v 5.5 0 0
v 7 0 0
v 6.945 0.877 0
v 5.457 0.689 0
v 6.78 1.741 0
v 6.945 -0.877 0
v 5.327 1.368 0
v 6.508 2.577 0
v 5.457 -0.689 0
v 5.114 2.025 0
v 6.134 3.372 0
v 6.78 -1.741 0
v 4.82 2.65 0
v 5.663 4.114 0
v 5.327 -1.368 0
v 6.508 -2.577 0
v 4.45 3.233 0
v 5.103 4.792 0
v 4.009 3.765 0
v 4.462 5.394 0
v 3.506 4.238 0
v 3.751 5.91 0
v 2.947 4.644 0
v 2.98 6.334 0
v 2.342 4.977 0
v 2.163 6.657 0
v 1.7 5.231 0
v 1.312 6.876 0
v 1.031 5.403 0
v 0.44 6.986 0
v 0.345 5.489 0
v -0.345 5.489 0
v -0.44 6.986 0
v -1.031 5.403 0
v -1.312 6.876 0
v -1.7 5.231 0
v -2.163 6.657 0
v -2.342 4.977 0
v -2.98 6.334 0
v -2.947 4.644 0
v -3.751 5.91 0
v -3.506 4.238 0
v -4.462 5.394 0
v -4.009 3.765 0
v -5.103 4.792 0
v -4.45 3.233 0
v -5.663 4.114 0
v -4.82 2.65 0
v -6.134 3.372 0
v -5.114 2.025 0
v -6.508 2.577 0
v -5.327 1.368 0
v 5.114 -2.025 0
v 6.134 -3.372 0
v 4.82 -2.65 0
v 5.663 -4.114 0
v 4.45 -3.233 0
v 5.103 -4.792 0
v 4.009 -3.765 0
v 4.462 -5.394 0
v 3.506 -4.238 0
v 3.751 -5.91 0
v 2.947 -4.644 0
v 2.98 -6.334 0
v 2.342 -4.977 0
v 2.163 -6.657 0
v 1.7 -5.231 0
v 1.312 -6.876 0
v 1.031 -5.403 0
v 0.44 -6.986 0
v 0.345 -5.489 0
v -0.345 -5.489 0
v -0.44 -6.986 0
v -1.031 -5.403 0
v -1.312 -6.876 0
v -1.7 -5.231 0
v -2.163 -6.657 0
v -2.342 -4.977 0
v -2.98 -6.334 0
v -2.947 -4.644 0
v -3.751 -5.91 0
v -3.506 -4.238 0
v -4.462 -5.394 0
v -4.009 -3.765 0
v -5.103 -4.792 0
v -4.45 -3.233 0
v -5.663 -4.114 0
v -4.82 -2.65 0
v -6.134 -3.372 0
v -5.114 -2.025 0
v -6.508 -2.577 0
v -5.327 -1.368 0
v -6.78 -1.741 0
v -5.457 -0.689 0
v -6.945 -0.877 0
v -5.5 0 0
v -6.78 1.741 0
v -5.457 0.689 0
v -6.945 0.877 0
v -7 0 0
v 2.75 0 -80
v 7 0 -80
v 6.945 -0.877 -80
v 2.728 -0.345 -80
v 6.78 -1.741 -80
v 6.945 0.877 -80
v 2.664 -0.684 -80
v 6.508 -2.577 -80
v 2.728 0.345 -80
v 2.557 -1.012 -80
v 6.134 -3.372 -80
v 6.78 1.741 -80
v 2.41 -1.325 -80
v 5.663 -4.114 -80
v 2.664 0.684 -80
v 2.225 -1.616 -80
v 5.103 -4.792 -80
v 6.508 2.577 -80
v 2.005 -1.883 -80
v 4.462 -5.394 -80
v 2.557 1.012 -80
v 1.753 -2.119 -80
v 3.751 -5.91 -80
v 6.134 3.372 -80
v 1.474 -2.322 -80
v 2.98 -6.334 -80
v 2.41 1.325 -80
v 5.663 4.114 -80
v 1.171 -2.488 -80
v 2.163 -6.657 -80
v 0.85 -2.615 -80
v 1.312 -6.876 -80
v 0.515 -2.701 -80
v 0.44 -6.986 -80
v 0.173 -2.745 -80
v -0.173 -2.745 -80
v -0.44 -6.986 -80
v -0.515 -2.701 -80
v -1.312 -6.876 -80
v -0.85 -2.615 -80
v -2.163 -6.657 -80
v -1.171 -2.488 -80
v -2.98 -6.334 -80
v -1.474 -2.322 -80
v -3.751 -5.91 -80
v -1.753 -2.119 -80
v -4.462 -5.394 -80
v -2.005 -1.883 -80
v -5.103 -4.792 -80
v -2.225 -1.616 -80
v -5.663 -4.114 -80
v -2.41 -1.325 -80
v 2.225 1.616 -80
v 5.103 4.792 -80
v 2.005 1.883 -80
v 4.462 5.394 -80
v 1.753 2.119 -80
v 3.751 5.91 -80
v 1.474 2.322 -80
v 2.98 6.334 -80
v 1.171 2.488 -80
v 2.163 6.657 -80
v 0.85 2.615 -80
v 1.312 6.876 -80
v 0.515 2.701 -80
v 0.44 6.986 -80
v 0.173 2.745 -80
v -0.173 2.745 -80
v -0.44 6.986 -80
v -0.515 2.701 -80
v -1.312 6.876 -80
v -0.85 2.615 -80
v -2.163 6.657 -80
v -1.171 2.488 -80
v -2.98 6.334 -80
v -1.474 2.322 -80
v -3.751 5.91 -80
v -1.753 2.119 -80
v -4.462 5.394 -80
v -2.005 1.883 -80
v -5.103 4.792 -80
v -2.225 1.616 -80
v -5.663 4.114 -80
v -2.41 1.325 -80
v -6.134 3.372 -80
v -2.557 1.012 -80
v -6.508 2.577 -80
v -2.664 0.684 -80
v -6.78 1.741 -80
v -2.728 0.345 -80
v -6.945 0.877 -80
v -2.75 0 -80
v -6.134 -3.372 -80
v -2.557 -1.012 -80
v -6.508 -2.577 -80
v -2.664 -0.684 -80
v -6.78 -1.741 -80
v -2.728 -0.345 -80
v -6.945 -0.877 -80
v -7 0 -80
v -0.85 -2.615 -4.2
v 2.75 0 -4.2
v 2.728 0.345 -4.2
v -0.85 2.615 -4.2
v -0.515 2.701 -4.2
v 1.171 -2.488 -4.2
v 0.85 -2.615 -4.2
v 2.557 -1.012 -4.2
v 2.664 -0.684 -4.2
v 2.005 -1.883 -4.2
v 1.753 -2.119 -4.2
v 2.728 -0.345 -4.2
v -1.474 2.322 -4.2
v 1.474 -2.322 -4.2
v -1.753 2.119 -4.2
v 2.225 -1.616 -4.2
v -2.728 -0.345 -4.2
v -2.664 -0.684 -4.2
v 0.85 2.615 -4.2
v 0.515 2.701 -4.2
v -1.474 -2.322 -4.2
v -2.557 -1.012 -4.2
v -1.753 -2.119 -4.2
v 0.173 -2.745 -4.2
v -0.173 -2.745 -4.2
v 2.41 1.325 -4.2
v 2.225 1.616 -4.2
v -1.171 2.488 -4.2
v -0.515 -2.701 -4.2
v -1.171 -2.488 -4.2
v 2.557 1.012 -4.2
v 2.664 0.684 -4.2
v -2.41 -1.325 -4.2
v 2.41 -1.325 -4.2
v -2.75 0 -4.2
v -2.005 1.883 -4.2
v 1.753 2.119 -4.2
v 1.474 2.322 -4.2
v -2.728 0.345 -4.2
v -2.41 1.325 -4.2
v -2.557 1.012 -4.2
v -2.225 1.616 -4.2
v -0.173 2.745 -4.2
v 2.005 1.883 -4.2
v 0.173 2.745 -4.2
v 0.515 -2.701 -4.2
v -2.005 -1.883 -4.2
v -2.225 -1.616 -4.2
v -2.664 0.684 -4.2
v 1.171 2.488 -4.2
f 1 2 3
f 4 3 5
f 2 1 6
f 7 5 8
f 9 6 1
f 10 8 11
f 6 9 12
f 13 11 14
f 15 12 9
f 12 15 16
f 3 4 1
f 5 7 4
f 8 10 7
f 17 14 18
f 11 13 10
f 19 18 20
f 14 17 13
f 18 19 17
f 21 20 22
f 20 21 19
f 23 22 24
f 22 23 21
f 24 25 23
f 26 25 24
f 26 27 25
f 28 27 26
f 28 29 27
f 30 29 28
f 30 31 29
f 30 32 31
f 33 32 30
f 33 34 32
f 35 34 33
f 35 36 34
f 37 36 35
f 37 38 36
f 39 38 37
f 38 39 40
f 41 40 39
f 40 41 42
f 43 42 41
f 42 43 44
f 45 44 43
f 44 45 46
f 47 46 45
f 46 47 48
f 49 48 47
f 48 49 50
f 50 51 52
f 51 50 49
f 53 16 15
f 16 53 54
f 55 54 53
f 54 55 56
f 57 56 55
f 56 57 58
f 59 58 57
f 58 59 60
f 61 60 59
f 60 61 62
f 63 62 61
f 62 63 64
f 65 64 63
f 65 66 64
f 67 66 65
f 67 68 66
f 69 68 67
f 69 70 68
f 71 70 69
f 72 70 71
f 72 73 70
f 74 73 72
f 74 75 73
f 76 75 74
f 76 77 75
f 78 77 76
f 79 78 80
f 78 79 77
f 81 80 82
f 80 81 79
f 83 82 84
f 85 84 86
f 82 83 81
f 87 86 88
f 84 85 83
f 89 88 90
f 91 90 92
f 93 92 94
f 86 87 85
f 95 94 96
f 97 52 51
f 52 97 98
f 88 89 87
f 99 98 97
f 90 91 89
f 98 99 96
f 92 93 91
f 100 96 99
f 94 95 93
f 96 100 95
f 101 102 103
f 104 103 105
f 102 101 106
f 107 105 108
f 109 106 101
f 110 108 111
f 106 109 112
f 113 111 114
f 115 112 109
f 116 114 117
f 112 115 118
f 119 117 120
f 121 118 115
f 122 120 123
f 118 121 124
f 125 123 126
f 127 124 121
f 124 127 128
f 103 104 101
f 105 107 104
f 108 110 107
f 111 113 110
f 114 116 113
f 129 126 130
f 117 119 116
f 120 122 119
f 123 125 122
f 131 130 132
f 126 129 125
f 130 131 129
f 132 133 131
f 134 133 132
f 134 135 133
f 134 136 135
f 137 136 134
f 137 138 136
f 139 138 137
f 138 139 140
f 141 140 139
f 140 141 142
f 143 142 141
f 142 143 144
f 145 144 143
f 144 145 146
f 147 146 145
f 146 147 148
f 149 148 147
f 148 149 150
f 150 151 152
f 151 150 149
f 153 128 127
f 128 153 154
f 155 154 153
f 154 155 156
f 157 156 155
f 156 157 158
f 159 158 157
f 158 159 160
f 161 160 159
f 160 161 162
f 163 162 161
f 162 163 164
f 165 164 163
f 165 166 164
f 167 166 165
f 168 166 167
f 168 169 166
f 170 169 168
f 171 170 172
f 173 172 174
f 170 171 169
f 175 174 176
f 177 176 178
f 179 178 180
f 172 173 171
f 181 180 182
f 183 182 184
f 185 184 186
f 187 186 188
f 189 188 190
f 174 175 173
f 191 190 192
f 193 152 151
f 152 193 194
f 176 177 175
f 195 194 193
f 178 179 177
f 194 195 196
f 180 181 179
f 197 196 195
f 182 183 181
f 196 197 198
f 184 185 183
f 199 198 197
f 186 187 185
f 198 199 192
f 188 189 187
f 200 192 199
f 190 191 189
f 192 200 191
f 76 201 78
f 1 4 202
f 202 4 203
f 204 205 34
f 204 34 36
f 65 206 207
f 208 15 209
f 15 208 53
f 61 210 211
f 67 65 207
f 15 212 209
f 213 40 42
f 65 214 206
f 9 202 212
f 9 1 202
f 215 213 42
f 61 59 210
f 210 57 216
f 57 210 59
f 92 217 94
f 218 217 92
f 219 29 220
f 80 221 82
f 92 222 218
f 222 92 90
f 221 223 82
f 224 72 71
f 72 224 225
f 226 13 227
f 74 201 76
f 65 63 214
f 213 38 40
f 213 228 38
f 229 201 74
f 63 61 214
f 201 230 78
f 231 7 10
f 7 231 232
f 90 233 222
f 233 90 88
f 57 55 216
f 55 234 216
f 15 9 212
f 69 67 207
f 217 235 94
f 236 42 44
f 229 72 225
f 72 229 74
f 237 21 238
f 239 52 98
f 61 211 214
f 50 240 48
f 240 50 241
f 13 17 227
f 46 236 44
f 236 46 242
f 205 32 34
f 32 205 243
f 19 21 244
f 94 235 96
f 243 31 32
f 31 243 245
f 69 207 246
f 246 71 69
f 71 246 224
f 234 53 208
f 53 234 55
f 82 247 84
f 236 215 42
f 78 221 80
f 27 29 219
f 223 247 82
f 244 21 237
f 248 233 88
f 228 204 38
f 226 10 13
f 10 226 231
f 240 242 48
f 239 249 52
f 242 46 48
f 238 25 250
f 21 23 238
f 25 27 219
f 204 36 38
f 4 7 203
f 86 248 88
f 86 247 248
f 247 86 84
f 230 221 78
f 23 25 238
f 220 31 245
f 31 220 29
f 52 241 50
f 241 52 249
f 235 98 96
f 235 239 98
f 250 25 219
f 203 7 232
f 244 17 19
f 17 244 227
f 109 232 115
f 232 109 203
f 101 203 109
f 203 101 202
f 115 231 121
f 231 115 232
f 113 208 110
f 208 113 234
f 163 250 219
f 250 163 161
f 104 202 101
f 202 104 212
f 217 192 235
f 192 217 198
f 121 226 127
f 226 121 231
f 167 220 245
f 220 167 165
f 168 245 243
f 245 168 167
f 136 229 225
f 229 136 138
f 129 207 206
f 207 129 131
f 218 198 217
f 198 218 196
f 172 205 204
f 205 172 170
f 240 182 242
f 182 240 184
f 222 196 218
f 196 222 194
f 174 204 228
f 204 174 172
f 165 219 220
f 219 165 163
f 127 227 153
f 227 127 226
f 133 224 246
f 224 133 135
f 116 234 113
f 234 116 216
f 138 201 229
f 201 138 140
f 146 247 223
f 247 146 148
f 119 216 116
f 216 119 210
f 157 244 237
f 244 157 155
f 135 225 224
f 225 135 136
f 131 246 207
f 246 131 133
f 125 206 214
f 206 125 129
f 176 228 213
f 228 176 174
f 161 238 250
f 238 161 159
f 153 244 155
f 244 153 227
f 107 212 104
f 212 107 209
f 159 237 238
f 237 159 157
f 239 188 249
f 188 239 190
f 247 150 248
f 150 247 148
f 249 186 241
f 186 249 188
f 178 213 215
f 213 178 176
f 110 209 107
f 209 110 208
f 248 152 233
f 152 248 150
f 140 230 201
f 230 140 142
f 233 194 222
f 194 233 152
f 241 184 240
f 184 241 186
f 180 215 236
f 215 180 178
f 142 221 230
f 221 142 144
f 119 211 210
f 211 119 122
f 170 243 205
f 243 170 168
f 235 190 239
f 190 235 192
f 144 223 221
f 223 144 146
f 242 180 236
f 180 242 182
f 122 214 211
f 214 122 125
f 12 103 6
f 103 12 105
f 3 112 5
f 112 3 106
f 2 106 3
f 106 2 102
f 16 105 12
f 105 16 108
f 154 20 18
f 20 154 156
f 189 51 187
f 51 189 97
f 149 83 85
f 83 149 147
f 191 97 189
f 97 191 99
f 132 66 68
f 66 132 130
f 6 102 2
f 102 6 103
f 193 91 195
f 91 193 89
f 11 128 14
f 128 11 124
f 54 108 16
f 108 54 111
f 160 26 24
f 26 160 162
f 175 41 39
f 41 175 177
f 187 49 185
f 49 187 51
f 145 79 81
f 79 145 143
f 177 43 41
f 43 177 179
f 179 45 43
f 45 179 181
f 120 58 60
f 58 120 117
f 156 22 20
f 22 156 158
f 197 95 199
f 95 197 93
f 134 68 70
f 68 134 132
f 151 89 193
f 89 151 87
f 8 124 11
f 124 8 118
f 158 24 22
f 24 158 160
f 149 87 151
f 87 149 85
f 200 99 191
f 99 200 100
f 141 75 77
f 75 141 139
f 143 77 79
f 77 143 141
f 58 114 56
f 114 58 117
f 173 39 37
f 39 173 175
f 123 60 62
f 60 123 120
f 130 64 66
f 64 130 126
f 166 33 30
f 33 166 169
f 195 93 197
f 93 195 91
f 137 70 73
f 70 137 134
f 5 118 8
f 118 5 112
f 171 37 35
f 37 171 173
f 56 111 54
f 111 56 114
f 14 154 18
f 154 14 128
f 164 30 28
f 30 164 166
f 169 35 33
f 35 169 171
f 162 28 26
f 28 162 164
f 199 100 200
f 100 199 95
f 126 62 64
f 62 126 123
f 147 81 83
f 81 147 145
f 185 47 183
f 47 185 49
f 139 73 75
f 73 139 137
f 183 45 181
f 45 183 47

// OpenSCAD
$fn = 50;


difference() {
	union() {
		translate(v = [0, 0, -80.0000000000]) {
			cylinder(h = 80, r = 7.0000000000);
		}
		cylinder(h = 0, r = 13.0000000000);
	}
	union() {
		translate(v = [0, 0, 0]) {
			rotate(a = [0, 0, 0]) {
				difference() {
					union() {
						#translate(v = [0, 0, -80.0000000000]) {
							cylinder(h = 80, r = 2.2500000000);
						}
						#translate(v = [0, 0, -4.2000000000]) {
							cylinder(h = 4.2000000000, r = 7.0000000000, r1 = 2.7500000000, r2 = 5.5000000000);
						}
						#translate(v = [0, 0, -80.0000000000]) {
							cylinder(h = 80, r = 2.7500000000);
						}
						#translate(v = [0, 0, -80.0000000000]) {
							cylinder(h = 80, r = 2.2500000000);
						}
					}
					union();
				}
			}
		}
	}
}
